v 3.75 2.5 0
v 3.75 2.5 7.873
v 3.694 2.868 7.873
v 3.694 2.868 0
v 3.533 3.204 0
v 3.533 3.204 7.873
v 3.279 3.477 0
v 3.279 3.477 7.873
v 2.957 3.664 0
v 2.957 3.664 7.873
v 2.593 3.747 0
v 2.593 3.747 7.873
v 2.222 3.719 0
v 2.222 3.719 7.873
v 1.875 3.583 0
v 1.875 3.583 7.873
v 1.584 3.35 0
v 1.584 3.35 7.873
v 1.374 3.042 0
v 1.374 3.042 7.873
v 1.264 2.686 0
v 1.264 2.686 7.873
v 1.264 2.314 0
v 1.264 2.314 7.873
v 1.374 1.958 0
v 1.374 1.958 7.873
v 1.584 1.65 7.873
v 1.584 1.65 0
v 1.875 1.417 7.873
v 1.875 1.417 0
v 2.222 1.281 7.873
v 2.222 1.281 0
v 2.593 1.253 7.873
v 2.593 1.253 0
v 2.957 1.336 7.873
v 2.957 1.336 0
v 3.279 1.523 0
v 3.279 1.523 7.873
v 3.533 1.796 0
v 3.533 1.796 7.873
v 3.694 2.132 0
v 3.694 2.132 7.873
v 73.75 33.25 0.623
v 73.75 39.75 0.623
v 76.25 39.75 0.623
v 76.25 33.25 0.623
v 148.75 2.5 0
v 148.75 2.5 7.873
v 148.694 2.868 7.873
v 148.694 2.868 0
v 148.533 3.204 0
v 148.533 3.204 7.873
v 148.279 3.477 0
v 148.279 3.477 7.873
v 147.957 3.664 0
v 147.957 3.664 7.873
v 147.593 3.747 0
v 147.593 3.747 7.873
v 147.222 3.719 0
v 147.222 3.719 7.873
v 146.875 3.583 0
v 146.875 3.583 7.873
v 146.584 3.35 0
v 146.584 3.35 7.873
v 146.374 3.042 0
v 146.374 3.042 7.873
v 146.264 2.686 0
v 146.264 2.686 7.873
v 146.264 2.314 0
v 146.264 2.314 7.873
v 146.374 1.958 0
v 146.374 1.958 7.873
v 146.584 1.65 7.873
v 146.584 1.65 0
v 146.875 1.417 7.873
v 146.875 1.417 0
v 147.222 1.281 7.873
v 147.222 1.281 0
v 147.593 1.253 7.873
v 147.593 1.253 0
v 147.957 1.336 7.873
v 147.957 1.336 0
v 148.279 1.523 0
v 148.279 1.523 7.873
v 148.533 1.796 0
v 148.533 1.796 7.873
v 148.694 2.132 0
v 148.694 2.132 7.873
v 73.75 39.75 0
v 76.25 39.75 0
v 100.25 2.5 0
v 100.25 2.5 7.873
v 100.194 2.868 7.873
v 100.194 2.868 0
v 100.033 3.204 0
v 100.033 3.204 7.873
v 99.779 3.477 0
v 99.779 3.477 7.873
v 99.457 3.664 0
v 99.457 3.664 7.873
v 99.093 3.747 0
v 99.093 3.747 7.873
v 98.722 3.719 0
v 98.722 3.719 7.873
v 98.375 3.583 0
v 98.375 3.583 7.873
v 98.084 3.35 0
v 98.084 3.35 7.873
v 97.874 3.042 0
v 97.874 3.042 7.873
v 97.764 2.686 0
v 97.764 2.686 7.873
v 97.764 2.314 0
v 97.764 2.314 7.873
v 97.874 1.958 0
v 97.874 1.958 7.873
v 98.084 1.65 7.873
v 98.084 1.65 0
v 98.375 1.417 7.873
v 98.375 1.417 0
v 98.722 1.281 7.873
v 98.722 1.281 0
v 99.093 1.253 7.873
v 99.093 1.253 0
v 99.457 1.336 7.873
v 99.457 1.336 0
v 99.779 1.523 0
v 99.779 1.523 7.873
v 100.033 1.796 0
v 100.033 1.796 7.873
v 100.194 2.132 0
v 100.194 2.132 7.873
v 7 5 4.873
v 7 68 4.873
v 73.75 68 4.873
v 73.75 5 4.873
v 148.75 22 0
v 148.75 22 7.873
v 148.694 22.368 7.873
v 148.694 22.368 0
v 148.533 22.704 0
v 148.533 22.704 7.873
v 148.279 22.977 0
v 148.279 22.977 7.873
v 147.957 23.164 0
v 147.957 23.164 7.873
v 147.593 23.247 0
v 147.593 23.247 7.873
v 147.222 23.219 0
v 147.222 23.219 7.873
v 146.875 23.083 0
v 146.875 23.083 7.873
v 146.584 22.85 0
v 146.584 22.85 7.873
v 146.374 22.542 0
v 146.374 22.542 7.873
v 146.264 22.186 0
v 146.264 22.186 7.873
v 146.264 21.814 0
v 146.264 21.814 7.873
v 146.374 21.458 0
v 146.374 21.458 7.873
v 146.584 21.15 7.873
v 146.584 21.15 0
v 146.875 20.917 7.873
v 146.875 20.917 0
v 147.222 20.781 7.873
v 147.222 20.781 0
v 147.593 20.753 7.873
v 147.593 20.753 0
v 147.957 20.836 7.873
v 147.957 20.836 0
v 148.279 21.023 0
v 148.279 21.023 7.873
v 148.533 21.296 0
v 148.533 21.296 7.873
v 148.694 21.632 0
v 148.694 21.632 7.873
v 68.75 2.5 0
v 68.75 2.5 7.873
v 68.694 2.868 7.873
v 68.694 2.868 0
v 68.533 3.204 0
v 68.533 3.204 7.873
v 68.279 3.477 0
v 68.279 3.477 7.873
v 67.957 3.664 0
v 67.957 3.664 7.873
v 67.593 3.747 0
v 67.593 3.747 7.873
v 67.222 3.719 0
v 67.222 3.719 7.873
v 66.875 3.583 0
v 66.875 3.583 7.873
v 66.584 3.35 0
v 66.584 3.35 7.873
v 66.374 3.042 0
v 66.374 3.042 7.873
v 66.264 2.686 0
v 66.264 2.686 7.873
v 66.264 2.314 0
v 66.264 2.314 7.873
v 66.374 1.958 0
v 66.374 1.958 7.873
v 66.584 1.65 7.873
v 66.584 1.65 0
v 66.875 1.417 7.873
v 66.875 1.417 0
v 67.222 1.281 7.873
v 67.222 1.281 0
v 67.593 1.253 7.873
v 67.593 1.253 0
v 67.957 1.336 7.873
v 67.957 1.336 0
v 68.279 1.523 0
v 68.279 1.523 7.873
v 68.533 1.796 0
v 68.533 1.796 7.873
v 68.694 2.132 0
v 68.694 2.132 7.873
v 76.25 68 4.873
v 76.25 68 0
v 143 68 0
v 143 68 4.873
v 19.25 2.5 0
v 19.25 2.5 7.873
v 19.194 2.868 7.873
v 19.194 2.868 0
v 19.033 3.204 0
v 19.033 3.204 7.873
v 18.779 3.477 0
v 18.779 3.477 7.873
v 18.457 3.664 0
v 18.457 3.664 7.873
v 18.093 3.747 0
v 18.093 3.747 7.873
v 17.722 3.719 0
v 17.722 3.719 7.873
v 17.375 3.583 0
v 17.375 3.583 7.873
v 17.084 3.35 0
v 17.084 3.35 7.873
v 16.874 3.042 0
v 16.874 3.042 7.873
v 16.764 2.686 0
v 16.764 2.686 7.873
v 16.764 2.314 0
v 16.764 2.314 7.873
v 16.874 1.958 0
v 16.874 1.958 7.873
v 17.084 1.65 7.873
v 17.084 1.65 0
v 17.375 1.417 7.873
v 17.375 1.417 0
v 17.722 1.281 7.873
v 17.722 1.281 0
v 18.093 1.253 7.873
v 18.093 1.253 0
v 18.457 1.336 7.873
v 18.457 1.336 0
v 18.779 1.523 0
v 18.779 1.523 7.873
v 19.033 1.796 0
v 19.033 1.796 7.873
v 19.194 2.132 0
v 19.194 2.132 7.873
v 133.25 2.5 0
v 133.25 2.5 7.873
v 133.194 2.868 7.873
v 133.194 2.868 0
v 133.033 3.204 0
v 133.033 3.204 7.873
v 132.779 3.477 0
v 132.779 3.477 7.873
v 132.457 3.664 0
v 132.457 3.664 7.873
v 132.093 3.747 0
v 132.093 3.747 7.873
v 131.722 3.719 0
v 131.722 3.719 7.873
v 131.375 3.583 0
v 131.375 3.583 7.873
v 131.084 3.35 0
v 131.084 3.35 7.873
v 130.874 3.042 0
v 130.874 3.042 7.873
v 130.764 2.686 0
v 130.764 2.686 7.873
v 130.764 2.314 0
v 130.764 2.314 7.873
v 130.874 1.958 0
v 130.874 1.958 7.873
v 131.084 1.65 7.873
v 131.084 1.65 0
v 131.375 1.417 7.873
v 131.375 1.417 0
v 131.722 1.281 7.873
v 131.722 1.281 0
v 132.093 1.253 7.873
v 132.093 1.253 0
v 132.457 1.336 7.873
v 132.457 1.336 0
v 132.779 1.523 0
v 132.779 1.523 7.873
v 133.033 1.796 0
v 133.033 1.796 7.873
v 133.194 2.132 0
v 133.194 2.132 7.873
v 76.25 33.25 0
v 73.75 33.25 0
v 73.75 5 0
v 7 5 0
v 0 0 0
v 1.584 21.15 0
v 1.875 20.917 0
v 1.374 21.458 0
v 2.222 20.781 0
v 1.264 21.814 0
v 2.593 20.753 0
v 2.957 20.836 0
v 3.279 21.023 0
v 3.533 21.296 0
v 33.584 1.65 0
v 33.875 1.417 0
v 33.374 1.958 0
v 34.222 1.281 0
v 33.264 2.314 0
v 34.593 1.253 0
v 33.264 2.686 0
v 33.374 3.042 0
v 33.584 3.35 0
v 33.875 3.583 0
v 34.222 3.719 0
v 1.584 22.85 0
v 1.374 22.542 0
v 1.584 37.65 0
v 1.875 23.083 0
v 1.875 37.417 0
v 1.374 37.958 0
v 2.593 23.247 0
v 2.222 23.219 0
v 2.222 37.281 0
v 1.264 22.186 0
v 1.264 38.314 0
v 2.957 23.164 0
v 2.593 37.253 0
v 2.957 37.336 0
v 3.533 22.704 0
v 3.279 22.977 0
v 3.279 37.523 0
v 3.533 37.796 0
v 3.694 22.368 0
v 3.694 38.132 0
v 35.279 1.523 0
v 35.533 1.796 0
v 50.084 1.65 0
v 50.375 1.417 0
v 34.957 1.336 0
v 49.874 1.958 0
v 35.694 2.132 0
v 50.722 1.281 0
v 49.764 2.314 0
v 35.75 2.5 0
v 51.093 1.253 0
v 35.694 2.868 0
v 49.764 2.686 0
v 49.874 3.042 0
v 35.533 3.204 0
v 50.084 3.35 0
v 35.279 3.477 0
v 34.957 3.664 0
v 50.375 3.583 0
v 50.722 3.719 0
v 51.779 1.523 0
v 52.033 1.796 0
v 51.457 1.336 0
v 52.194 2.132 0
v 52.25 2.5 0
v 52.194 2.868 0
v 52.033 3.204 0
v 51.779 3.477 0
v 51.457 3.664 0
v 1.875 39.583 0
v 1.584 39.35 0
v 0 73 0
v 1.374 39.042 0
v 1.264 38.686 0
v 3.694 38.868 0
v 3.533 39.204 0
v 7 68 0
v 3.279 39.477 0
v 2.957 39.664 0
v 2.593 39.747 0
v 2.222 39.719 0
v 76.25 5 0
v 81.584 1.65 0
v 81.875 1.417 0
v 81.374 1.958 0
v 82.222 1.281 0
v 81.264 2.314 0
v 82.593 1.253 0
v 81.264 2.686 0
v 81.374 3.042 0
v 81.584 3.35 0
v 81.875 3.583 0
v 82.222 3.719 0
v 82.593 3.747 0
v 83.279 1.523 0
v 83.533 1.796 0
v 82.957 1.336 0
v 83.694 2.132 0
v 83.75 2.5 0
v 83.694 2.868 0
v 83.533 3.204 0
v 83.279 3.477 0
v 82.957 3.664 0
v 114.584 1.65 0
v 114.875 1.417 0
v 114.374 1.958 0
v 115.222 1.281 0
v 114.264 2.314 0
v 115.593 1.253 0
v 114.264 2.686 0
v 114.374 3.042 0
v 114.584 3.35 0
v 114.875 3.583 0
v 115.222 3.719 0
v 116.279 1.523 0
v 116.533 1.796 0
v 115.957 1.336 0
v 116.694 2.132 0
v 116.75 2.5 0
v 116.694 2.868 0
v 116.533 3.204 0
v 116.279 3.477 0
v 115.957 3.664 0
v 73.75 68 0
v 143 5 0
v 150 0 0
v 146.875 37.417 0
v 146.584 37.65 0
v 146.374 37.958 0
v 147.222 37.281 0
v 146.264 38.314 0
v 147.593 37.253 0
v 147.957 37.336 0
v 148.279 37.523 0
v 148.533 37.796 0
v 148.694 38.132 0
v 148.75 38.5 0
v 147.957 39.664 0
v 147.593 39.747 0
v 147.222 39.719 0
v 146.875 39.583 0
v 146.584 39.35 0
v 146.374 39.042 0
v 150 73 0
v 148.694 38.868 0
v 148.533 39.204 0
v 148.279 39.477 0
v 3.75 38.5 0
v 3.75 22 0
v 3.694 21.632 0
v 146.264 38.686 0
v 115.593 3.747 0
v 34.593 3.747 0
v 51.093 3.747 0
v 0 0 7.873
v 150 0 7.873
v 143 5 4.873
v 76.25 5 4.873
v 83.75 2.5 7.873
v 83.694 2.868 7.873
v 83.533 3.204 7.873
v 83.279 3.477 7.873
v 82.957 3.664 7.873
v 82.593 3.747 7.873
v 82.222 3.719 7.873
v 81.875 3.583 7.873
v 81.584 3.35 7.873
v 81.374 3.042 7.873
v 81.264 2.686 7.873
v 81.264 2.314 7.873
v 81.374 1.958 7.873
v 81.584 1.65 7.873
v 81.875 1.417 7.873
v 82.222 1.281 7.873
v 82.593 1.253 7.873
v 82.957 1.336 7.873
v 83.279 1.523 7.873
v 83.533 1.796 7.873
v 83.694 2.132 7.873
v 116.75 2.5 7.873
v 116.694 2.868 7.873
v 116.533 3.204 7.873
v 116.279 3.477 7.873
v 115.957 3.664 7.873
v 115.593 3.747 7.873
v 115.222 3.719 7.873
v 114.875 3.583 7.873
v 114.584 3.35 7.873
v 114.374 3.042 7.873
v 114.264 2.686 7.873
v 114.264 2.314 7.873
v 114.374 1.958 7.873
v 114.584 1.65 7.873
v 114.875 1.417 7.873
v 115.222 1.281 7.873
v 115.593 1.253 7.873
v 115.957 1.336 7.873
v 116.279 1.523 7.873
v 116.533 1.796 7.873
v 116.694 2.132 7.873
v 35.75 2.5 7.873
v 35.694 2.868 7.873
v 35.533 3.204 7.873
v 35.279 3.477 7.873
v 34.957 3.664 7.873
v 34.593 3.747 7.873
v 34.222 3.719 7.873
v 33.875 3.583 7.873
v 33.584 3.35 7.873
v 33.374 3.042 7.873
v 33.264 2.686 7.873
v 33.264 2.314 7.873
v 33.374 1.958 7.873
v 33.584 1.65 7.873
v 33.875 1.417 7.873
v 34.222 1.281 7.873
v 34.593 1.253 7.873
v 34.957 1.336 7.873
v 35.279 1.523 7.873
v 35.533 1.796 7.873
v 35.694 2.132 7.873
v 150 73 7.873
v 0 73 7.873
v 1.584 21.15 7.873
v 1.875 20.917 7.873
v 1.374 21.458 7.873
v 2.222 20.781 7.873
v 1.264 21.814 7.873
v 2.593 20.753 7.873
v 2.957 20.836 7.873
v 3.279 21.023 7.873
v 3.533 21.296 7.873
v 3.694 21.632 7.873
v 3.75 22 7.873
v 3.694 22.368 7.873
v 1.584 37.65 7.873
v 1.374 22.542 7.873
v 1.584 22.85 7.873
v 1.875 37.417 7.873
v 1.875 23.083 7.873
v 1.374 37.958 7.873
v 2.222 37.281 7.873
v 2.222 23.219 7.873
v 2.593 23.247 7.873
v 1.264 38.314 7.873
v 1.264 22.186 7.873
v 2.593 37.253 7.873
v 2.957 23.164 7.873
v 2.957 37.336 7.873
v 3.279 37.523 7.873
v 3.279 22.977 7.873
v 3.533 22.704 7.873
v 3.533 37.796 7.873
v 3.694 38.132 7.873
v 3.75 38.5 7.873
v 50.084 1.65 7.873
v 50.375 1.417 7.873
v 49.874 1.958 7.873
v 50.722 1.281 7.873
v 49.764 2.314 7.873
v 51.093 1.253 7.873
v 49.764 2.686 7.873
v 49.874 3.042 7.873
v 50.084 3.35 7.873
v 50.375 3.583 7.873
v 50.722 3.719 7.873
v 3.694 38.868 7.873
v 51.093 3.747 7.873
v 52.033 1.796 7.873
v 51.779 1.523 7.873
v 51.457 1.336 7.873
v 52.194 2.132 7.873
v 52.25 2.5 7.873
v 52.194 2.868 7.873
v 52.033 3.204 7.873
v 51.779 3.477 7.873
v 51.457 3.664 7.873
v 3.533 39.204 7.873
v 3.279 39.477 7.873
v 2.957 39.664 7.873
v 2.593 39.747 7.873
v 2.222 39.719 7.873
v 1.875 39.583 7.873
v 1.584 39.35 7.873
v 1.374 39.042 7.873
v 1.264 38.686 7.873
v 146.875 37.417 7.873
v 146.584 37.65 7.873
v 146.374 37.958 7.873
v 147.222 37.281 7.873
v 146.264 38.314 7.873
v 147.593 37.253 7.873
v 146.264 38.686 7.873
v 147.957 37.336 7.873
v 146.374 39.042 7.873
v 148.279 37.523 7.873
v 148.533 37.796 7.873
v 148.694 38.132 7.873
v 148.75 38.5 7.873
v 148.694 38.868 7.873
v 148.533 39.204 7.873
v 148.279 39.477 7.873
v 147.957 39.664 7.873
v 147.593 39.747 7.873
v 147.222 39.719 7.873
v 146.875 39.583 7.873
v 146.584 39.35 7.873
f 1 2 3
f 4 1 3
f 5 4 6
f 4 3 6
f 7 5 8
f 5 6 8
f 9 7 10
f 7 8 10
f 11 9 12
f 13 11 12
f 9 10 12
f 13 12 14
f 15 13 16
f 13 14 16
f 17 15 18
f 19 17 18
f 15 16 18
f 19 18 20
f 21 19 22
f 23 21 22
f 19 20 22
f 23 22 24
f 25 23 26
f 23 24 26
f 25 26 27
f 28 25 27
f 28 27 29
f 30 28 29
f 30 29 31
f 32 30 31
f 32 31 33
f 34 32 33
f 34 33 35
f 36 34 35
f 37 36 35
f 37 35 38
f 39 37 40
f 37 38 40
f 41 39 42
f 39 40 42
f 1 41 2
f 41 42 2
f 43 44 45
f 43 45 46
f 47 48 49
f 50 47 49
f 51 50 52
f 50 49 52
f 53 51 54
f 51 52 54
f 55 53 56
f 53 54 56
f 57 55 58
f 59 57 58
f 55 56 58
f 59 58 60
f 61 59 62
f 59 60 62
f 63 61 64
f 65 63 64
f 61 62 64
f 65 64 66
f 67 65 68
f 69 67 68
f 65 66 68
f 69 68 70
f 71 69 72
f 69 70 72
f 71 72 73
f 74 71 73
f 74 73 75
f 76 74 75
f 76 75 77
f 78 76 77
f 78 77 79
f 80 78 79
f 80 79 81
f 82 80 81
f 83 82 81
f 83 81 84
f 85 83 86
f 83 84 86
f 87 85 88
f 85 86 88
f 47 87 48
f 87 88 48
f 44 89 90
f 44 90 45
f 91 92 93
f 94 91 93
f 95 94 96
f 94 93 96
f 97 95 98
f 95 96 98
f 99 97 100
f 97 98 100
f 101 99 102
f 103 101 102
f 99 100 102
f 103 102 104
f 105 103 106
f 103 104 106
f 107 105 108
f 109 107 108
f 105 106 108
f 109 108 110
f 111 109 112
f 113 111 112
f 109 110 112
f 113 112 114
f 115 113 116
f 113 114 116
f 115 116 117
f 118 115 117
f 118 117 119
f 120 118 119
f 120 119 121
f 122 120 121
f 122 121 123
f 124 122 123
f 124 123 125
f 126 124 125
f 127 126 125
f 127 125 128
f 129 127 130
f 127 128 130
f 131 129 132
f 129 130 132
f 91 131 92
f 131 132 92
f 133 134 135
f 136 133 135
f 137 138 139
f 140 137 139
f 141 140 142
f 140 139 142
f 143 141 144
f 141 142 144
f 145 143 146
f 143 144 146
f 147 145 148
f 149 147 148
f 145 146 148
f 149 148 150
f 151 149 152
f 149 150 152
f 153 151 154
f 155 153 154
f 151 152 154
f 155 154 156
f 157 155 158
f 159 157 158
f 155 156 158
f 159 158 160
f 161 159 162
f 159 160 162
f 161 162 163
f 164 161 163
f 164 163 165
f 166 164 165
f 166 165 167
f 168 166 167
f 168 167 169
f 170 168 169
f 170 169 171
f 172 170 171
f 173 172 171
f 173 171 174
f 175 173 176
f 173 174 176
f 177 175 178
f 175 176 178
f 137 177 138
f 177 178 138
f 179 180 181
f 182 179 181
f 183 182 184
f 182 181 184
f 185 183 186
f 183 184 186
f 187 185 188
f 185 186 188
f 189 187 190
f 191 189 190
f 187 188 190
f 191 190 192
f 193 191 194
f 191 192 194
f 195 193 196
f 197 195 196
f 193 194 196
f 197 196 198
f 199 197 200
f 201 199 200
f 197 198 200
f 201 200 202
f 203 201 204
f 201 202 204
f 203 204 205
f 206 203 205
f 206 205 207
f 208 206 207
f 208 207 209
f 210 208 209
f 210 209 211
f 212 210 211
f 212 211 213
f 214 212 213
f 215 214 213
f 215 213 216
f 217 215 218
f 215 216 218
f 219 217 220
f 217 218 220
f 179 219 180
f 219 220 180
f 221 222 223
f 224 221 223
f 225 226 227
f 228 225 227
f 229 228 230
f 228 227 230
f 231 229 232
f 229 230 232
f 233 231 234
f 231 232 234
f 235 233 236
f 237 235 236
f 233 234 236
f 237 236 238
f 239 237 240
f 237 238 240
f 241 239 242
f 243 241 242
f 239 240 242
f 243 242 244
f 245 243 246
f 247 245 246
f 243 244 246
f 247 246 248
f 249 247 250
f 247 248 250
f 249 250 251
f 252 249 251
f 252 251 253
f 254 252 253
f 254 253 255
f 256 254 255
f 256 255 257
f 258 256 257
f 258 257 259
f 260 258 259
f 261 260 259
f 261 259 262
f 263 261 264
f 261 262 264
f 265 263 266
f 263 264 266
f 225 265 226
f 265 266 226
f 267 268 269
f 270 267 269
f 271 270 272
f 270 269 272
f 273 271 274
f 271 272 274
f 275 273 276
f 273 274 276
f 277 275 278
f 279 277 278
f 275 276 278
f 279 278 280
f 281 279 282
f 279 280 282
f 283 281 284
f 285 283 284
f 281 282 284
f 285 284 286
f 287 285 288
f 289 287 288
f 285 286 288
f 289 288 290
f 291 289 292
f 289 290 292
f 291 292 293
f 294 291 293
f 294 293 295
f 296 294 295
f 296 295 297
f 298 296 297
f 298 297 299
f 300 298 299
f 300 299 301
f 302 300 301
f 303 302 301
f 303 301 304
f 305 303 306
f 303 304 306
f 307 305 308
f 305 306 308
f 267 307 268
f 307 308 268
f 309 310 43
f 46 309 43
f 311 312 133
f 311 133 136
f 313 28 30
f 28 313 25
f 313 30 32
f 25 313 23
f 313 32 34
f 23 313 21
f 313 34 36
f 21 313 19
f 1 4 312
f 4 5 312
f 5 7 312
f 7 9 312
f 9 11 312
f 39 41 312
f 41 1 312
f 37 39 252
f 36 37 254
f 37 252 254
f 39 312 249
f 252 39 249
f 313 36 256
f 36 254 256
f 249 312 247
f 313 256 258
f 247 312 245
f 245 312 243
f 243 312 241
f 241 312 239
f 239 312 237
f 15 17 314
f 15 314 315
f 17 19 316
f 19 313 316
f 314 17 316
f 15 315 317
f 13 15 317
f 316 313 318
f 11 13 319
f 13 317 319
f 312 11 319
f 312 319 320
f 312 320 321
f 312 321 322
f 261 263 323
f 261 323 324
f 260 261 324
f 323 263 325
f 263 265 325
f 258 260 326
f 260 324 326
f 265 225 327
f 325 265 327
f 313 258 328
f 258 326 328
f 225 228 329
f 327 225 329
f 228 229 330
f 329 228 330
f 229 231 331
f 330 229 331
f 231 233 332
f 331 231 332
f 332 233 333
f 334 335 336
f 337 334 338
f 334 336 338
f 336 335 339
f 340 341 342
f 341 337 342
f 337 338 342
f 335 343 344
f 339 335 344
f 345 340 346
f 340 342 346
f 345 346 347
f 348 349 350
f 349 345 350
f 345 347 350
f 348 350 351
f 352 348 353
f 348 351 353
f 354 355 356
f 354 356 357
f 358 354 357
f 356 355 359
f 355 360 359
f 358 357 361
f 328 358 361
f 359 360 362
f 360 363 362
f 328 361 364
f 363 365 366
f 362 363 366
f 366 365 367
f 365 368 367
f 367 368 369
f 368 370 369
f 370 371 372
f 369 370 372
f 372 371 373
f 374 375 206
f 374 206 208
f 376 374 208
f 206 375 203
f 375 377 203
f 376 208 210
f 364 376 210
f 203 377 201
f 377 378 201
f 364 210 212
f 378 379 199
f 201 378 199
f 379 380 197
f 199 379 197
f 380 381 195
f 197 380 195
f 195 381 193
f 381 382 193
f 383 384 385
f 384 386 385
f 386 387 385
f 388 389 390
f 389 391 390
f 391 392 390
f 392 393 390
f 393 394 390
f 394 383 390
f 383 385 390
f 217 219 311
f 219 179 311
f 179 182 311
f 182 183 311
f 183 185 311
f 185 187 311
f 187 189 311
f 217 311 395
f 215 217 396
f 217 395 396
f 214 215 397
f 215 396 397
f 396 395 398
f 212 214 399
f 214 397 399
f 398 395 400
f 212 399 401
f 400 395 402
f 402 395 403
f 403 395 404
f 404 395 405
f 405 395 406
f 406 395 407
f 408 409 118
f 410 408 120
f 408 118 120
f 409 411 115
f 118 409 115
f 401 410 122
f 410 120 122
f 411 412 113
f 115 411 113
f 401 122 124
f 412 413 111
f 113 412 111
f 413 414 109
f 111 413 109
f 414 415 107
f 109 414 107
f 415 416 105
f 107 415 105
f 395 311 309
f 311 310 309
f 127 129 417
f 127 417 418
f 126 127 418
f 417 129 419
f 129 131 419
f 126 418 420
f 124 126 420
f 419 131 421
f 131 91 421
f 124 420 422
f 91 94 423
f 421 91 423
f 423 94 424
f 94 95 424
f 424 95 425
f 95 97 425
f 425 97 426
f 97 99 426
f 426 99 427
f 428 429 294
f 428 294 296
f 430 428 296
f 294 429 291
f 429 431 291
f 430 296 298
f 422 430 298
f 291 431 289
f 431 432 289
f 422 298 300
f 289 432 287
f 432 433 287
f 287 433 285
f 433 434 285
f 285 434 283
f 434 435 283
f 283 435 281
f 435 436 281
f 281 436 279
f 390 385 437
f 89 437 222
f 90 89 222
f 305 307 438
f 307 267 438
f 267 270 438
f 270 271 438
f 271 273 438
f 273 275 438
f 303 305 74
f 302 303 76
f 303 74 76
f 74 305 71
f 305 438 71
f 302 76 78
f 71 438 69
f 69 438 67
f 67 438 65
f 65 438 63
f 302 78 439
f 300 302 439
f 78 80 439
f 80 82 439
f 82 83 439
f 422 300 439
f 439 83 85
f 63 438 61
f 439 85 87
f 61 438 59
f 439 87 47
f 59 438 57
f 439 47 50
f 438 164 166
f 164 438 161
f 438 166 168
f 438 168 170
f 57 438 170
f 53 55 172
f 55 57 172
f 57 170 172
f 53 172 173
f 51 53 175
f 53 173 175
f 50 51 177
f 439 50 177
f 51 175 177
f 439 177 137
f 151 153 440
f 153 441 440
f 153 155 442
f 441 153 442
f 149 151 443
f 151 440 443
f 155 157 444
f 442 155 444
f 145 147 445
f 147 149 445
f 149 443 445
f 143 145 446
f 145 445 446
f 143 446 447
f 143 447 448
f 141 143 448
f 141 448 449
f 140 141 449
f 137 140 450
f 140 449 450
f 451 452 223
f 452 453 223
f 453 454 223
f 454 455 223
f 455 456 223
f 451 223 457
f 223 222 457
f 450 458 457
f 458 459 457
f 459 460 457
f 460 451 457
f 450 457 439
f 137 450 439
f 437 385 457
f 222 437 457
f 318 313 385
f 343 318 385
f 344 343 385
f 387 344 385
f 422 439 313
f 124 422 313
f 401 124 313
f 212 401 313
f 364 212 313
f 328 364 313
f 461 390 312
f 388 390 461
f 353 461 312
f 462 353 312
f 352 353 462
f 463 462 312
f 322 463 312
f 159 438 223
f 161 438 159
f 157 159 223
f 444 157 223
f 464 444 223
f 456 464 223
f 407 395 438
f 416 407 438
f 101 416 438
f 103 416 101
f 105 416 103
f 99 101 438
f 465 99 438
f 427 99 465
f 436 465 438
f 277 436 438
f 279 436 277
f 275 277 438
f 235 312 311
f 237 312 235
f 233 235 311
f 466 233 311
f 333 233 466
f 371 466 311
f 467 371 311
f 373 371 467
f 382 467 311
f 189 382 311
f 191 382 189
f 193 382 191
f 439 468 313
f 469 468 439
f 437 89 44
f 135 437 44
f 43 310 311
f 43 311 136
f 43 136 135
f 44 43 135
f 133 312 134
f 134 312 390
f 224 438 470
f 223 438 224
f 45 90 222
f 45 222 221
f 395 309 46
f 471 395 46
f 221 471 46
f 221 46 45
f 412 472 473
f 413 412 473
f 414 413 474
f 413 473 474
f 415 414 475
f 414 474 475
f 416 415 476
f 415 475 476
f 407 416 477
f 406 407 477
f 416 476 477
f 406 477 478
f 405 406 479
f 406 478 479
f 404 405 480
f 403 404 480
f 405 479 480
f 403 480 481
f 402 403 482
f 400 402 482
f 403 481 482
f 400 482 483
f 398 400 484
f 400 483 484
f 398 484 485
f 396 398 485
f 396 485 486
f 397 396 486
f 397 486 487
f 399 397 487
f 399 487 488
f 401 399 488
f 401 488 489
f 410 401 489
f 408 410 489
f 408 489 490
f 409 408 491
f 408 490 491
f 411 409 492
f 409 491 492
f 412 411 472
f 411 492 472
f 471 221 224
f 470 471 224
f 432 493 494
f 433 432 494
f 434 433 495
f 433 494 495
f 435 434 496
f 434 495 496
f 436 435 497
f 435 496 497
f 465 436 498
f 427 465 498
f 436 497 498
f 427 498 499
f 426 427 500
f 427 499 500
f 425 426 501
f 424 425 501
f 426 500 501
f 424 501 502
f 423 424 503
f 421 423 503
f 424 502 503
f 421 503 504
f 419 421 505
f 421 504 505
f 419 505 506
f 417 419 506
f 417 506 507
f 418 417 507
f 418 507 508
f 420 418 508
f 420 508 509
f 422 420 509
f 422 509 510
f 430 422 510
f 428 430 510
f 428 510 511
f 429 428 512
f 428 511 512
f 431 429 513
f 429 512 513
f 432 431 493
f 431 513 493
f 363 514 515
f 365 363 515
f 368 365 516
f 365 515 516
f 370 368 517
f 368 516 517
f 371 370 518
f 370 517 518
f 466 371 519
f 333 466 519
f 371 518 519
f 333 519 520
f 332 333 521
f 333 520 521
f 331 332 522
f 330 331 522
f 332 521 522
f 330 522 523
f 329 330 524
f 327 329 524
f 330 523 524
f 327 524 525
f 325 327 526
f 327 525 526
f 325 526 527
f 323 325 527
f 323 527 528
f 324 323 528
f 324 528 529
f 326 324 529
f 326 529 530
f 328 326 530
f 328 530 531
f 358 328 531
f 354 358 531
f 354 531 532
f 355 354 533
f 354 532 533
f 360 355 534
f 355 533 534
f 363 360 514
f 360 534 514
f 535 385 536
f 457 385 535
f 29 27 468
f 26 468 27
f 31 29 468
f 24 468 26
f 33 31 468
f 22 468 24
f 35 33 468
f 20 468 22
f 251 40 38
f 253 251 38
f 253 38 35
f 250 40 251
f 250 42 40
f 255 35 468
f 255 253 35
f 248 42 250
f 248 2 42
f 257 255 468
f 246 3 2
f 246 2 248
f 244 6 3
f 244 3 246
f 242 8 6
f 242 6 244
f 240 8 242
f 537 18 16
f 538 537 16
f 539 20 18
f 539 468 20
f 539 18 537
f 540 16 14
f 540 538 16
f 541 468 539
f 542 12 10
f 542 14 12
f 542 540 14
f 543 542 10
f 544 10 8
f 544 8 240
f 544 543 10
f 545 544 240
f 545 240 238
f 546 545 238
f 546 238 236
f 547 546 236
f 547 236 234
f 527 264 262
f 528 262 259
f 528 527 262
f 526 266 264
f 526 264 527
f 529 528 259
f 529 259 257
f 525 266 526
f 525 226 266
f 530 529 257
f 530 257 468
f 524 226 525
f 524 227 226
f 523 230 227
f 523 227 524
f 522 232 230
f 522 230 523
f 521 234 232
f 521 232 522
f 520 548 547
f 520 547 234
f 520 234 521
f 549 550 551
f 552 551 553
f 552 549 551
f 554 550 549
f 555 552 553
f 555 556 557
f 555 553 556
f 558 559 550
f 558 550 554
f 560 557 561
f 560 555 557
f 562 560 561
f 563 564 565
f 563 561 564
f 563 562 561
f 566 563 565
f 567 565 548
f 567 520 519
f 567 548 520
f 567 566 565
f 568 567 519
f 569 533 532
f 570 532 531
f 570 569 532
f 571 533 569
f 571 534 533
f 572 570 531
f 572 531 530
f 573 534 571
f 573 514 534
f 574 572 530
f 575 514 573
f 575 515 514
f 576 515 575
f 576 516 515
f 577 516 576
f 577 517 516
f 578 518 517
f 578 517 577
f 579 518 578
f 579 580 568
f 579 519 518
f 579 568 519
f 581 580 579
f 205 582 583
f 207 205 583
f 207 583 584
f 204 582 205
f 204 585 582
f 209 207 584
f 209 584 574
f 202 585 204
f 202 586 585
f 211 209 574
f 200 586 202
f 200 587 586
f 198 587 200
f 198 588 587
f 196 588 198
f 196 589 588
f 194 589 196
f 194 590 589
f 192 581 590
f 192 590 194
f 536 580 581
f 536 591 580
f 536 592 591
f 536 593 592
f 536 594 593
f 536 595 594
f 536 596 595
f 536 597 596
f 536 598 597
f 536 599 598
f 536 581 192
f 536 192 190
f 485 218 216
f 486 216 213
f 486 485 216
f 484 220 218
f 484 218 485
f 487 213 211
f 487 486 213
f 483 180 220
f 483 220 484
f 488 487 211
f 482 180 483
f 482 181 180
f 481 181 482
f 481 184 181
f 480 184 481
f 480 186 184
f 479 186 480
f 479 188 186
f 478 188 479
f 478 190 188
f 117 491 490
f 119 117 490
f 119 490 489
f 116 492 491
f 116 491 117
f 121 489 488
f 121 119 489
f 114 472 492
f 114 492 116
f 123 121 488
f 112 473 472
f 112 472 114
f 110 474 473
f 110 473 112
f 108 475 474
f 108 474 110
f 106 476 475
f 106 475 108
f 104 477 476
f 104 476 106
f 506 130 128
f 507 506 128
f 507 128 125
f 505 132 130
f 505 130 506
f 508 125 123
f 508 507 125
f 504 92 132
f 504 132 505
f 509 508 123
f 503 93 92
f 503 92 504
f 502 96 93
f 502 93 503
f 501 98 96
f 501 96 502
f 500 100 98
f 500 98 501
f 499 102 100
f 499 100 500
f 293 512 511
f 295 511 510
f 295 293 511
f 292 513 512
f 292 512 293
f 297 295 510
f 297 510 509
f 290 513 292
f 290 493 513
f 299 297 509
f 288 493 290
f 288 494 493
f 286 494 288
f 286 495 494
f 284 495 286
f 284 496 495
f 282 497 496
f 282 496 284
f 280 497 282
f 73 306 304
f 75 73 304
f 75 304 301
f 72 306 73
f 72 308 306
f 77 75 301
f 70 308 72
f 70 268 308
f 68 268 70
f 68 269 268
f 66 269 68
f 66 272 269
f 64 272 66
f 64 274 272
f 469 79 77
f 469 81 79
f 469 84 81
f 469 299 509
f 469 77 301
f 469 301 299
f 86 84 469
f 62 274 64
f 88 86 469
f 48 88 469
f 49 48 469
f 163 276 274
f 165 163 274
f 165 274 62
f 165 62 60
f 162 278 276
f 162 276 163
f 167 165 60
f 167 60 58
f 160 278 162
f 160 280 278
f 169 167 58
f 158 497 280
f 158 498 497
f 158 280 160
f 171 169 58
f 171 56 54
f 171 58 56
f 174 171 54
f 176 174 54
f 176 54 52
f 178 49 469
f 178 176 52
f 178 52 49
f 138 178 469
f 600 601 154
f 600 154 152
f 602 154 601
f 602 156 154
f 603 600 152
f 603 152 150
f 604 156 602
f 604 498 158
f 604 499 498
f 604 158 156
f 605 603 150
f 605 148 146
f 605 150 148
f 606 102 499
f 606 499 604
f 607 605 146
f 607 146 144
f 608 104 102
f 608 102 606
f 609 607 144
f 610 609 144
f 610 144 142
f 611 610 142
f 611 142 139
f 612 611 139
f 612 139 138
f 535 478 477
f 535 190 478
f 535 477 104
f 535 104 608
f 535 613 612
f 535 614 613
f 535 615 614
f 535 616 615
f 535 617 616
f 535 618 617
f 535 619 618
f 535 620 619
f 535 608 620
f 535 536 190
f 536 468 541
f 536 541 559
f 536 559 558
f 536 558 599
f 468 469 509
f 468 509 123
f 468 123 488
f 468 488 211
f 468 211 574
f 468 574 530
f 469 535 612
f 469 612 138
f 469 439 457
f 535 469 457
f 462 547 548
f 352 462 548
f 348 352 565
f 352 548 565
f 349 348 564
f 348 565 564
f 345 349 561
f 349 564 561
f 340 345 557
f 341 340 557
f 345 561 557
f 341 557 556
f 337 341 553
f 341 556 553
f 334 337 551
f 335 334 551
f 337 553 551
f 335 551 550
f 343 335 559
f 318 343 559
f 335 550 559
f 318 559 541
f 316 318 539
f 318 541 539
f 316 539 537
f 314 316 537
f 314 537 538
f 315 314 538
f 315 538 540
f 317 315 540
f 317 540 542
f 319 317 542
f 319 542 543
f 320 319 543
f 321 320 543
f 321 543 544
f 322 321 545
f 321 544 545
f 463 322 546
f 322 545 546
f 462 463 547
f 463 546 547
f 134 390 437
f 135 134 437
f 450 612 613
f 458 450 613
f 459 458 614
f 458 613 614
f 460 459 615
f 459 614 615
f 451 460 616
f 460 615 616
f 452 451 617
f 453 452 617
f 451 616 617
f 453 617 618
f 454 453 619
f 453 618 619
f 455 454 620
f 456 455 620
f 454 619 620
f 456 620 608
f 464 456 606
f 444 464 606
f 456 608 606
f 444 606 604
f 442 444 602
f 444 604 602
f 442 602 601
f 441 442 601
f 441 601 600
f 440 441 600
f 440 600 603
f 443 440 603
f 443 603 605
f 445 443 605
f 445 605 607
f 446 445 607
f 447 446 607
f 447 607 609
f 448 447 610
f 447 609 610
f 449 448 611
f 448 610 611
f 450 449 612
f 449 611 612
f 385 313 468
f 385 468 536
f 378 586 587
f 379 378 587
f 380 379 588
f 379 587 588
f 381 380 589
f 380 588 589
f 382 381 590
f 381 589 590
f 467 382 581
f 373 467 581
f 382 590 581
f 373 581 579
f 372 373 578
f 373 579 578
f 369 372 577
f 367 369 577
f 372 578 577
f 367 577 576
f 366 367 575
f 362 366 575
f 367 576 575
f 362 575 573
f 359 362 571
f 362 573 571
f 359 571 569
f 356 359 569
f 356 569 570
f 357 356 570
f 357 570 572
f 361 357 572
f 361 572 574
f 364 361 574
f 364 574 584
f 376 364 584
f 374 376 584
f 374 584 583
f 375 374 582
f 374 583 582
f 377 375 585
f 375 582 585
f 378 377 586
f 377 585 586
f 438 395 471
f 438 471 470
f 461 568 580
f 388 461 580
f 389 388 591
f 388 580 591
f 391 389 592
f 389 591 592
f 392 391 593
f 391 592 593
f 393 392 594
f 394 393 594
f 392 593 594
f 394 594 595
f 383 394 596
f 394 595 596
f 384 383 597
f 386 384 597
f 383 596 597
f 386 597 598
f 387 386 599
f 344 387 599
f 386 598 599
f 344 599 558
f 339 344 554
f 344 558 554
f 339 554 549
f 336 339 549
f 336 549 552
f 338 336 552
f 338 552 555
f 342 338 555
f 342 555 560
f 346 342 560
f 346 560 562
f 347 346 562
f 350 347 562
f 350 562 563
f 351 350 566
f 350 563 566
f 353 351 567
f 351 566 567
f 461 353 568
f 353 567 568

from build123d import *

# Parameters (mm, degrees)
F0_W      = 150
F0_H      = 73
F1_DEPTH  = 7.873
F2_W      = 136
F2_H      = 63
F3_DEPTH  = 4.873
F4_W      = 2.5
F4_H      = 4.873
F5_DEPTH  = 73
F6_W      = 6.5
F6_H      = 0.623
F7_DEPTH  = 2.5
F8_R      = 1.25
F9_DEPTH  = 7.873
F10_R     = 1.25
F11_DEPTH = 7.873
F12_R     = 1.25
F13_DEPTH = 7.873
F14_R     = 1.25
F15_DEPTH = 7.873
F16_R     = 1.25
F17_DEPTH = 7.873
F18_R     = 1.25
F19_DEPTH = 7.873
F20_R     = 1.25
F21_DEPTH = 7.873
F22_R     = 1.25
F23_DEPTH = 7.873
F24_R     = 1.25
F25_DEPTH = 7.873
F26_R     = 1.25
F27_DEPTH = 7.873
F28_R     = 1.25
F29_DEPTH = 7.873
F30_R     = 1.25
F31_DEPTH = 7.873
F32_R     = 1.25
F33_DEPTH = 7.873
F34_R     = 1.25
F35_DEPTH = 7.873


with BuildPart() as f1:
    # F0 (on Top) → F1 (new body)
    with BuildSketch(Plane.XY):
        with Locations((75, 36.5)):
            Rectangle(F0_W, F0_H)
    extrude(amount=F1_DEPTH)

    # F2 (on Top) → F3 (cut)
    with BuildSketch(Plane.XY):
        with Locations((75, 36.5)):
            Rectangle(F2_W, F2_H)
    extrude(amount=F3_DEPTH, mode=Mode.SUBTRACT)

    # F4 (on Front) → F5 (join)
    with BuildSketch(Plane.XZ):
        with Locations((75, 2.4365)):
            Rectangle(F4_W, F4_H)
    extrude(amount=-F5_DEPTH)

    # F6 (on face) → F7 (cut)
    with BuildSketch(Plane(origin=(73.75, 0, 0), x_dir=(0, -1, 0), z_dir=(-1, 0, 0))):
        with Locations((-36.5, 0.3115)):
            Rectangle(F6_W, F6_H)
    extrude(amount=-F7_DEPTH, mode=Mode.SUBTRACT)

    # F8 (on face) → F9 (cut)
    with BuildSketch(Plane.XY.offset(7.873)):
        with Locations((2.5, 2.5)):
            Circle(F8_R)
    extrude(amount=-F9_DEPTH, mode=Mode.SUBTRACT)

    # F10 (on face) → F11 (cut)
    with BuildSketch(Plane.XY.offset(7.873)):
        with Locations((18, 2.5)):
            Circle(F10_R)
    extrude(amount=-F11_DEPTH, mode=Mode.SUBTRACT)

    # F12 (on face) → F13 (cut)
    with BuildSketch(Plane.XY.offset(7.873)):
        with Locations((34.5, 2.5)):
            Circle(F12_R)
    extrude(amount=-F13_DEPTH, mode=Mode.SUBTRACT)

    # F14 (on face) → F15 (cut)
    with BuildSketch(Plane.XY.offset(7.873)):
        with Locations((51, 2.5)):
            Circle(F14_R)
    extrude(amount=-F15_DEPTH, mode=Mode.SUBTRACT)

    # F16 (on face) → F17 (cut)
    with BuildSketch(Plane.XY.offset(7.873)):
        with Locations((67.5, 2.5)):
            Circle(F16_R)
    extrude(amount=-F17_DEPTH, mode=Mode.SUBTRACT)

    # F18 (on face) → F19 (cut)
    with BuildSketch(Plane.XY.offset(7.873)):
        with Locations((82.5, 2.5)):
            Circle(F18_R)
    extrude(amount=-F19_DEPTH, mode=Mode.SUBTRACT)

    # F20 (on face) → F21 (cut)
    with BuildSketch(Plane.XY.offset(7.873)):
        with Locations((99, 2.5)):
            Circle(F20_R)
    extrude(amount=-F21_DEPTH, mode=Mode.SUBTRACT)

    # F22 (on face) → F23 (cut)
    with BuildSketch(Plane.XY.offset(7.873)):
        with Locations((115.5, 2.5)):
            Circle(F22_R)
    extrude(amount=-F23_DEPTH, mode=Mode.SUBTRACT)

    # F24 (on face) → F25 (cut)
    with BuildSketch(Plane.XY.offset(7.873)):
        with Locations((132, 2.5)):
            Circle(F24_R)
    extrude(amount=-F25_DEPTH, mode=Mode.SUBTRACT)

    # F26 (on face) → F27 (cut)
    with BuildSketch(Plane.XY.offset(7.873)):
        with Locations((147.5, 2.5)):
            Circle(F26_R)
    extrude(amount=-F27_DEPTH, mode=Mode.SUBTRACT)

    # F28 (on face) → F29 (cut)
    with BuildSketch(Plane.XY.offset(7.873)):
        with Locations((2.5, 22)):
            Circle(F28_R)
    extrude(amount=-F29_DEPTH, mode=Mode.SUBTRACT)

    # F30 (on face) → F31 (cut)
    with BuildSketch(Plane.XY.offset(7.873)):
        with Locations((147.5, 22)):
            Circle(F30_R)
    extrude(amount=-F31_DEPTH, mode=Mode.SUBTRACT)

    # F32 (on face) → F33 (cut)
    with BuildSketch(Plane.XY.offset(7.873)):
        with Locations((147.5, 38.5)):
            Circle(F32_R)
    extrude(amount=-F33_DEPTH, mode=Mode.SUBTRACT)

    # F34 (on face) → F35 (cut)
    with BuildSketch(Plane.XY.offset(7.873)):
        with Locations((2.5, 38.5)):
            Circle(F34_R)
    extrude(amount=-F35_DEPTH, mode=Mode.SUBTRACT)


solid = f1.part
